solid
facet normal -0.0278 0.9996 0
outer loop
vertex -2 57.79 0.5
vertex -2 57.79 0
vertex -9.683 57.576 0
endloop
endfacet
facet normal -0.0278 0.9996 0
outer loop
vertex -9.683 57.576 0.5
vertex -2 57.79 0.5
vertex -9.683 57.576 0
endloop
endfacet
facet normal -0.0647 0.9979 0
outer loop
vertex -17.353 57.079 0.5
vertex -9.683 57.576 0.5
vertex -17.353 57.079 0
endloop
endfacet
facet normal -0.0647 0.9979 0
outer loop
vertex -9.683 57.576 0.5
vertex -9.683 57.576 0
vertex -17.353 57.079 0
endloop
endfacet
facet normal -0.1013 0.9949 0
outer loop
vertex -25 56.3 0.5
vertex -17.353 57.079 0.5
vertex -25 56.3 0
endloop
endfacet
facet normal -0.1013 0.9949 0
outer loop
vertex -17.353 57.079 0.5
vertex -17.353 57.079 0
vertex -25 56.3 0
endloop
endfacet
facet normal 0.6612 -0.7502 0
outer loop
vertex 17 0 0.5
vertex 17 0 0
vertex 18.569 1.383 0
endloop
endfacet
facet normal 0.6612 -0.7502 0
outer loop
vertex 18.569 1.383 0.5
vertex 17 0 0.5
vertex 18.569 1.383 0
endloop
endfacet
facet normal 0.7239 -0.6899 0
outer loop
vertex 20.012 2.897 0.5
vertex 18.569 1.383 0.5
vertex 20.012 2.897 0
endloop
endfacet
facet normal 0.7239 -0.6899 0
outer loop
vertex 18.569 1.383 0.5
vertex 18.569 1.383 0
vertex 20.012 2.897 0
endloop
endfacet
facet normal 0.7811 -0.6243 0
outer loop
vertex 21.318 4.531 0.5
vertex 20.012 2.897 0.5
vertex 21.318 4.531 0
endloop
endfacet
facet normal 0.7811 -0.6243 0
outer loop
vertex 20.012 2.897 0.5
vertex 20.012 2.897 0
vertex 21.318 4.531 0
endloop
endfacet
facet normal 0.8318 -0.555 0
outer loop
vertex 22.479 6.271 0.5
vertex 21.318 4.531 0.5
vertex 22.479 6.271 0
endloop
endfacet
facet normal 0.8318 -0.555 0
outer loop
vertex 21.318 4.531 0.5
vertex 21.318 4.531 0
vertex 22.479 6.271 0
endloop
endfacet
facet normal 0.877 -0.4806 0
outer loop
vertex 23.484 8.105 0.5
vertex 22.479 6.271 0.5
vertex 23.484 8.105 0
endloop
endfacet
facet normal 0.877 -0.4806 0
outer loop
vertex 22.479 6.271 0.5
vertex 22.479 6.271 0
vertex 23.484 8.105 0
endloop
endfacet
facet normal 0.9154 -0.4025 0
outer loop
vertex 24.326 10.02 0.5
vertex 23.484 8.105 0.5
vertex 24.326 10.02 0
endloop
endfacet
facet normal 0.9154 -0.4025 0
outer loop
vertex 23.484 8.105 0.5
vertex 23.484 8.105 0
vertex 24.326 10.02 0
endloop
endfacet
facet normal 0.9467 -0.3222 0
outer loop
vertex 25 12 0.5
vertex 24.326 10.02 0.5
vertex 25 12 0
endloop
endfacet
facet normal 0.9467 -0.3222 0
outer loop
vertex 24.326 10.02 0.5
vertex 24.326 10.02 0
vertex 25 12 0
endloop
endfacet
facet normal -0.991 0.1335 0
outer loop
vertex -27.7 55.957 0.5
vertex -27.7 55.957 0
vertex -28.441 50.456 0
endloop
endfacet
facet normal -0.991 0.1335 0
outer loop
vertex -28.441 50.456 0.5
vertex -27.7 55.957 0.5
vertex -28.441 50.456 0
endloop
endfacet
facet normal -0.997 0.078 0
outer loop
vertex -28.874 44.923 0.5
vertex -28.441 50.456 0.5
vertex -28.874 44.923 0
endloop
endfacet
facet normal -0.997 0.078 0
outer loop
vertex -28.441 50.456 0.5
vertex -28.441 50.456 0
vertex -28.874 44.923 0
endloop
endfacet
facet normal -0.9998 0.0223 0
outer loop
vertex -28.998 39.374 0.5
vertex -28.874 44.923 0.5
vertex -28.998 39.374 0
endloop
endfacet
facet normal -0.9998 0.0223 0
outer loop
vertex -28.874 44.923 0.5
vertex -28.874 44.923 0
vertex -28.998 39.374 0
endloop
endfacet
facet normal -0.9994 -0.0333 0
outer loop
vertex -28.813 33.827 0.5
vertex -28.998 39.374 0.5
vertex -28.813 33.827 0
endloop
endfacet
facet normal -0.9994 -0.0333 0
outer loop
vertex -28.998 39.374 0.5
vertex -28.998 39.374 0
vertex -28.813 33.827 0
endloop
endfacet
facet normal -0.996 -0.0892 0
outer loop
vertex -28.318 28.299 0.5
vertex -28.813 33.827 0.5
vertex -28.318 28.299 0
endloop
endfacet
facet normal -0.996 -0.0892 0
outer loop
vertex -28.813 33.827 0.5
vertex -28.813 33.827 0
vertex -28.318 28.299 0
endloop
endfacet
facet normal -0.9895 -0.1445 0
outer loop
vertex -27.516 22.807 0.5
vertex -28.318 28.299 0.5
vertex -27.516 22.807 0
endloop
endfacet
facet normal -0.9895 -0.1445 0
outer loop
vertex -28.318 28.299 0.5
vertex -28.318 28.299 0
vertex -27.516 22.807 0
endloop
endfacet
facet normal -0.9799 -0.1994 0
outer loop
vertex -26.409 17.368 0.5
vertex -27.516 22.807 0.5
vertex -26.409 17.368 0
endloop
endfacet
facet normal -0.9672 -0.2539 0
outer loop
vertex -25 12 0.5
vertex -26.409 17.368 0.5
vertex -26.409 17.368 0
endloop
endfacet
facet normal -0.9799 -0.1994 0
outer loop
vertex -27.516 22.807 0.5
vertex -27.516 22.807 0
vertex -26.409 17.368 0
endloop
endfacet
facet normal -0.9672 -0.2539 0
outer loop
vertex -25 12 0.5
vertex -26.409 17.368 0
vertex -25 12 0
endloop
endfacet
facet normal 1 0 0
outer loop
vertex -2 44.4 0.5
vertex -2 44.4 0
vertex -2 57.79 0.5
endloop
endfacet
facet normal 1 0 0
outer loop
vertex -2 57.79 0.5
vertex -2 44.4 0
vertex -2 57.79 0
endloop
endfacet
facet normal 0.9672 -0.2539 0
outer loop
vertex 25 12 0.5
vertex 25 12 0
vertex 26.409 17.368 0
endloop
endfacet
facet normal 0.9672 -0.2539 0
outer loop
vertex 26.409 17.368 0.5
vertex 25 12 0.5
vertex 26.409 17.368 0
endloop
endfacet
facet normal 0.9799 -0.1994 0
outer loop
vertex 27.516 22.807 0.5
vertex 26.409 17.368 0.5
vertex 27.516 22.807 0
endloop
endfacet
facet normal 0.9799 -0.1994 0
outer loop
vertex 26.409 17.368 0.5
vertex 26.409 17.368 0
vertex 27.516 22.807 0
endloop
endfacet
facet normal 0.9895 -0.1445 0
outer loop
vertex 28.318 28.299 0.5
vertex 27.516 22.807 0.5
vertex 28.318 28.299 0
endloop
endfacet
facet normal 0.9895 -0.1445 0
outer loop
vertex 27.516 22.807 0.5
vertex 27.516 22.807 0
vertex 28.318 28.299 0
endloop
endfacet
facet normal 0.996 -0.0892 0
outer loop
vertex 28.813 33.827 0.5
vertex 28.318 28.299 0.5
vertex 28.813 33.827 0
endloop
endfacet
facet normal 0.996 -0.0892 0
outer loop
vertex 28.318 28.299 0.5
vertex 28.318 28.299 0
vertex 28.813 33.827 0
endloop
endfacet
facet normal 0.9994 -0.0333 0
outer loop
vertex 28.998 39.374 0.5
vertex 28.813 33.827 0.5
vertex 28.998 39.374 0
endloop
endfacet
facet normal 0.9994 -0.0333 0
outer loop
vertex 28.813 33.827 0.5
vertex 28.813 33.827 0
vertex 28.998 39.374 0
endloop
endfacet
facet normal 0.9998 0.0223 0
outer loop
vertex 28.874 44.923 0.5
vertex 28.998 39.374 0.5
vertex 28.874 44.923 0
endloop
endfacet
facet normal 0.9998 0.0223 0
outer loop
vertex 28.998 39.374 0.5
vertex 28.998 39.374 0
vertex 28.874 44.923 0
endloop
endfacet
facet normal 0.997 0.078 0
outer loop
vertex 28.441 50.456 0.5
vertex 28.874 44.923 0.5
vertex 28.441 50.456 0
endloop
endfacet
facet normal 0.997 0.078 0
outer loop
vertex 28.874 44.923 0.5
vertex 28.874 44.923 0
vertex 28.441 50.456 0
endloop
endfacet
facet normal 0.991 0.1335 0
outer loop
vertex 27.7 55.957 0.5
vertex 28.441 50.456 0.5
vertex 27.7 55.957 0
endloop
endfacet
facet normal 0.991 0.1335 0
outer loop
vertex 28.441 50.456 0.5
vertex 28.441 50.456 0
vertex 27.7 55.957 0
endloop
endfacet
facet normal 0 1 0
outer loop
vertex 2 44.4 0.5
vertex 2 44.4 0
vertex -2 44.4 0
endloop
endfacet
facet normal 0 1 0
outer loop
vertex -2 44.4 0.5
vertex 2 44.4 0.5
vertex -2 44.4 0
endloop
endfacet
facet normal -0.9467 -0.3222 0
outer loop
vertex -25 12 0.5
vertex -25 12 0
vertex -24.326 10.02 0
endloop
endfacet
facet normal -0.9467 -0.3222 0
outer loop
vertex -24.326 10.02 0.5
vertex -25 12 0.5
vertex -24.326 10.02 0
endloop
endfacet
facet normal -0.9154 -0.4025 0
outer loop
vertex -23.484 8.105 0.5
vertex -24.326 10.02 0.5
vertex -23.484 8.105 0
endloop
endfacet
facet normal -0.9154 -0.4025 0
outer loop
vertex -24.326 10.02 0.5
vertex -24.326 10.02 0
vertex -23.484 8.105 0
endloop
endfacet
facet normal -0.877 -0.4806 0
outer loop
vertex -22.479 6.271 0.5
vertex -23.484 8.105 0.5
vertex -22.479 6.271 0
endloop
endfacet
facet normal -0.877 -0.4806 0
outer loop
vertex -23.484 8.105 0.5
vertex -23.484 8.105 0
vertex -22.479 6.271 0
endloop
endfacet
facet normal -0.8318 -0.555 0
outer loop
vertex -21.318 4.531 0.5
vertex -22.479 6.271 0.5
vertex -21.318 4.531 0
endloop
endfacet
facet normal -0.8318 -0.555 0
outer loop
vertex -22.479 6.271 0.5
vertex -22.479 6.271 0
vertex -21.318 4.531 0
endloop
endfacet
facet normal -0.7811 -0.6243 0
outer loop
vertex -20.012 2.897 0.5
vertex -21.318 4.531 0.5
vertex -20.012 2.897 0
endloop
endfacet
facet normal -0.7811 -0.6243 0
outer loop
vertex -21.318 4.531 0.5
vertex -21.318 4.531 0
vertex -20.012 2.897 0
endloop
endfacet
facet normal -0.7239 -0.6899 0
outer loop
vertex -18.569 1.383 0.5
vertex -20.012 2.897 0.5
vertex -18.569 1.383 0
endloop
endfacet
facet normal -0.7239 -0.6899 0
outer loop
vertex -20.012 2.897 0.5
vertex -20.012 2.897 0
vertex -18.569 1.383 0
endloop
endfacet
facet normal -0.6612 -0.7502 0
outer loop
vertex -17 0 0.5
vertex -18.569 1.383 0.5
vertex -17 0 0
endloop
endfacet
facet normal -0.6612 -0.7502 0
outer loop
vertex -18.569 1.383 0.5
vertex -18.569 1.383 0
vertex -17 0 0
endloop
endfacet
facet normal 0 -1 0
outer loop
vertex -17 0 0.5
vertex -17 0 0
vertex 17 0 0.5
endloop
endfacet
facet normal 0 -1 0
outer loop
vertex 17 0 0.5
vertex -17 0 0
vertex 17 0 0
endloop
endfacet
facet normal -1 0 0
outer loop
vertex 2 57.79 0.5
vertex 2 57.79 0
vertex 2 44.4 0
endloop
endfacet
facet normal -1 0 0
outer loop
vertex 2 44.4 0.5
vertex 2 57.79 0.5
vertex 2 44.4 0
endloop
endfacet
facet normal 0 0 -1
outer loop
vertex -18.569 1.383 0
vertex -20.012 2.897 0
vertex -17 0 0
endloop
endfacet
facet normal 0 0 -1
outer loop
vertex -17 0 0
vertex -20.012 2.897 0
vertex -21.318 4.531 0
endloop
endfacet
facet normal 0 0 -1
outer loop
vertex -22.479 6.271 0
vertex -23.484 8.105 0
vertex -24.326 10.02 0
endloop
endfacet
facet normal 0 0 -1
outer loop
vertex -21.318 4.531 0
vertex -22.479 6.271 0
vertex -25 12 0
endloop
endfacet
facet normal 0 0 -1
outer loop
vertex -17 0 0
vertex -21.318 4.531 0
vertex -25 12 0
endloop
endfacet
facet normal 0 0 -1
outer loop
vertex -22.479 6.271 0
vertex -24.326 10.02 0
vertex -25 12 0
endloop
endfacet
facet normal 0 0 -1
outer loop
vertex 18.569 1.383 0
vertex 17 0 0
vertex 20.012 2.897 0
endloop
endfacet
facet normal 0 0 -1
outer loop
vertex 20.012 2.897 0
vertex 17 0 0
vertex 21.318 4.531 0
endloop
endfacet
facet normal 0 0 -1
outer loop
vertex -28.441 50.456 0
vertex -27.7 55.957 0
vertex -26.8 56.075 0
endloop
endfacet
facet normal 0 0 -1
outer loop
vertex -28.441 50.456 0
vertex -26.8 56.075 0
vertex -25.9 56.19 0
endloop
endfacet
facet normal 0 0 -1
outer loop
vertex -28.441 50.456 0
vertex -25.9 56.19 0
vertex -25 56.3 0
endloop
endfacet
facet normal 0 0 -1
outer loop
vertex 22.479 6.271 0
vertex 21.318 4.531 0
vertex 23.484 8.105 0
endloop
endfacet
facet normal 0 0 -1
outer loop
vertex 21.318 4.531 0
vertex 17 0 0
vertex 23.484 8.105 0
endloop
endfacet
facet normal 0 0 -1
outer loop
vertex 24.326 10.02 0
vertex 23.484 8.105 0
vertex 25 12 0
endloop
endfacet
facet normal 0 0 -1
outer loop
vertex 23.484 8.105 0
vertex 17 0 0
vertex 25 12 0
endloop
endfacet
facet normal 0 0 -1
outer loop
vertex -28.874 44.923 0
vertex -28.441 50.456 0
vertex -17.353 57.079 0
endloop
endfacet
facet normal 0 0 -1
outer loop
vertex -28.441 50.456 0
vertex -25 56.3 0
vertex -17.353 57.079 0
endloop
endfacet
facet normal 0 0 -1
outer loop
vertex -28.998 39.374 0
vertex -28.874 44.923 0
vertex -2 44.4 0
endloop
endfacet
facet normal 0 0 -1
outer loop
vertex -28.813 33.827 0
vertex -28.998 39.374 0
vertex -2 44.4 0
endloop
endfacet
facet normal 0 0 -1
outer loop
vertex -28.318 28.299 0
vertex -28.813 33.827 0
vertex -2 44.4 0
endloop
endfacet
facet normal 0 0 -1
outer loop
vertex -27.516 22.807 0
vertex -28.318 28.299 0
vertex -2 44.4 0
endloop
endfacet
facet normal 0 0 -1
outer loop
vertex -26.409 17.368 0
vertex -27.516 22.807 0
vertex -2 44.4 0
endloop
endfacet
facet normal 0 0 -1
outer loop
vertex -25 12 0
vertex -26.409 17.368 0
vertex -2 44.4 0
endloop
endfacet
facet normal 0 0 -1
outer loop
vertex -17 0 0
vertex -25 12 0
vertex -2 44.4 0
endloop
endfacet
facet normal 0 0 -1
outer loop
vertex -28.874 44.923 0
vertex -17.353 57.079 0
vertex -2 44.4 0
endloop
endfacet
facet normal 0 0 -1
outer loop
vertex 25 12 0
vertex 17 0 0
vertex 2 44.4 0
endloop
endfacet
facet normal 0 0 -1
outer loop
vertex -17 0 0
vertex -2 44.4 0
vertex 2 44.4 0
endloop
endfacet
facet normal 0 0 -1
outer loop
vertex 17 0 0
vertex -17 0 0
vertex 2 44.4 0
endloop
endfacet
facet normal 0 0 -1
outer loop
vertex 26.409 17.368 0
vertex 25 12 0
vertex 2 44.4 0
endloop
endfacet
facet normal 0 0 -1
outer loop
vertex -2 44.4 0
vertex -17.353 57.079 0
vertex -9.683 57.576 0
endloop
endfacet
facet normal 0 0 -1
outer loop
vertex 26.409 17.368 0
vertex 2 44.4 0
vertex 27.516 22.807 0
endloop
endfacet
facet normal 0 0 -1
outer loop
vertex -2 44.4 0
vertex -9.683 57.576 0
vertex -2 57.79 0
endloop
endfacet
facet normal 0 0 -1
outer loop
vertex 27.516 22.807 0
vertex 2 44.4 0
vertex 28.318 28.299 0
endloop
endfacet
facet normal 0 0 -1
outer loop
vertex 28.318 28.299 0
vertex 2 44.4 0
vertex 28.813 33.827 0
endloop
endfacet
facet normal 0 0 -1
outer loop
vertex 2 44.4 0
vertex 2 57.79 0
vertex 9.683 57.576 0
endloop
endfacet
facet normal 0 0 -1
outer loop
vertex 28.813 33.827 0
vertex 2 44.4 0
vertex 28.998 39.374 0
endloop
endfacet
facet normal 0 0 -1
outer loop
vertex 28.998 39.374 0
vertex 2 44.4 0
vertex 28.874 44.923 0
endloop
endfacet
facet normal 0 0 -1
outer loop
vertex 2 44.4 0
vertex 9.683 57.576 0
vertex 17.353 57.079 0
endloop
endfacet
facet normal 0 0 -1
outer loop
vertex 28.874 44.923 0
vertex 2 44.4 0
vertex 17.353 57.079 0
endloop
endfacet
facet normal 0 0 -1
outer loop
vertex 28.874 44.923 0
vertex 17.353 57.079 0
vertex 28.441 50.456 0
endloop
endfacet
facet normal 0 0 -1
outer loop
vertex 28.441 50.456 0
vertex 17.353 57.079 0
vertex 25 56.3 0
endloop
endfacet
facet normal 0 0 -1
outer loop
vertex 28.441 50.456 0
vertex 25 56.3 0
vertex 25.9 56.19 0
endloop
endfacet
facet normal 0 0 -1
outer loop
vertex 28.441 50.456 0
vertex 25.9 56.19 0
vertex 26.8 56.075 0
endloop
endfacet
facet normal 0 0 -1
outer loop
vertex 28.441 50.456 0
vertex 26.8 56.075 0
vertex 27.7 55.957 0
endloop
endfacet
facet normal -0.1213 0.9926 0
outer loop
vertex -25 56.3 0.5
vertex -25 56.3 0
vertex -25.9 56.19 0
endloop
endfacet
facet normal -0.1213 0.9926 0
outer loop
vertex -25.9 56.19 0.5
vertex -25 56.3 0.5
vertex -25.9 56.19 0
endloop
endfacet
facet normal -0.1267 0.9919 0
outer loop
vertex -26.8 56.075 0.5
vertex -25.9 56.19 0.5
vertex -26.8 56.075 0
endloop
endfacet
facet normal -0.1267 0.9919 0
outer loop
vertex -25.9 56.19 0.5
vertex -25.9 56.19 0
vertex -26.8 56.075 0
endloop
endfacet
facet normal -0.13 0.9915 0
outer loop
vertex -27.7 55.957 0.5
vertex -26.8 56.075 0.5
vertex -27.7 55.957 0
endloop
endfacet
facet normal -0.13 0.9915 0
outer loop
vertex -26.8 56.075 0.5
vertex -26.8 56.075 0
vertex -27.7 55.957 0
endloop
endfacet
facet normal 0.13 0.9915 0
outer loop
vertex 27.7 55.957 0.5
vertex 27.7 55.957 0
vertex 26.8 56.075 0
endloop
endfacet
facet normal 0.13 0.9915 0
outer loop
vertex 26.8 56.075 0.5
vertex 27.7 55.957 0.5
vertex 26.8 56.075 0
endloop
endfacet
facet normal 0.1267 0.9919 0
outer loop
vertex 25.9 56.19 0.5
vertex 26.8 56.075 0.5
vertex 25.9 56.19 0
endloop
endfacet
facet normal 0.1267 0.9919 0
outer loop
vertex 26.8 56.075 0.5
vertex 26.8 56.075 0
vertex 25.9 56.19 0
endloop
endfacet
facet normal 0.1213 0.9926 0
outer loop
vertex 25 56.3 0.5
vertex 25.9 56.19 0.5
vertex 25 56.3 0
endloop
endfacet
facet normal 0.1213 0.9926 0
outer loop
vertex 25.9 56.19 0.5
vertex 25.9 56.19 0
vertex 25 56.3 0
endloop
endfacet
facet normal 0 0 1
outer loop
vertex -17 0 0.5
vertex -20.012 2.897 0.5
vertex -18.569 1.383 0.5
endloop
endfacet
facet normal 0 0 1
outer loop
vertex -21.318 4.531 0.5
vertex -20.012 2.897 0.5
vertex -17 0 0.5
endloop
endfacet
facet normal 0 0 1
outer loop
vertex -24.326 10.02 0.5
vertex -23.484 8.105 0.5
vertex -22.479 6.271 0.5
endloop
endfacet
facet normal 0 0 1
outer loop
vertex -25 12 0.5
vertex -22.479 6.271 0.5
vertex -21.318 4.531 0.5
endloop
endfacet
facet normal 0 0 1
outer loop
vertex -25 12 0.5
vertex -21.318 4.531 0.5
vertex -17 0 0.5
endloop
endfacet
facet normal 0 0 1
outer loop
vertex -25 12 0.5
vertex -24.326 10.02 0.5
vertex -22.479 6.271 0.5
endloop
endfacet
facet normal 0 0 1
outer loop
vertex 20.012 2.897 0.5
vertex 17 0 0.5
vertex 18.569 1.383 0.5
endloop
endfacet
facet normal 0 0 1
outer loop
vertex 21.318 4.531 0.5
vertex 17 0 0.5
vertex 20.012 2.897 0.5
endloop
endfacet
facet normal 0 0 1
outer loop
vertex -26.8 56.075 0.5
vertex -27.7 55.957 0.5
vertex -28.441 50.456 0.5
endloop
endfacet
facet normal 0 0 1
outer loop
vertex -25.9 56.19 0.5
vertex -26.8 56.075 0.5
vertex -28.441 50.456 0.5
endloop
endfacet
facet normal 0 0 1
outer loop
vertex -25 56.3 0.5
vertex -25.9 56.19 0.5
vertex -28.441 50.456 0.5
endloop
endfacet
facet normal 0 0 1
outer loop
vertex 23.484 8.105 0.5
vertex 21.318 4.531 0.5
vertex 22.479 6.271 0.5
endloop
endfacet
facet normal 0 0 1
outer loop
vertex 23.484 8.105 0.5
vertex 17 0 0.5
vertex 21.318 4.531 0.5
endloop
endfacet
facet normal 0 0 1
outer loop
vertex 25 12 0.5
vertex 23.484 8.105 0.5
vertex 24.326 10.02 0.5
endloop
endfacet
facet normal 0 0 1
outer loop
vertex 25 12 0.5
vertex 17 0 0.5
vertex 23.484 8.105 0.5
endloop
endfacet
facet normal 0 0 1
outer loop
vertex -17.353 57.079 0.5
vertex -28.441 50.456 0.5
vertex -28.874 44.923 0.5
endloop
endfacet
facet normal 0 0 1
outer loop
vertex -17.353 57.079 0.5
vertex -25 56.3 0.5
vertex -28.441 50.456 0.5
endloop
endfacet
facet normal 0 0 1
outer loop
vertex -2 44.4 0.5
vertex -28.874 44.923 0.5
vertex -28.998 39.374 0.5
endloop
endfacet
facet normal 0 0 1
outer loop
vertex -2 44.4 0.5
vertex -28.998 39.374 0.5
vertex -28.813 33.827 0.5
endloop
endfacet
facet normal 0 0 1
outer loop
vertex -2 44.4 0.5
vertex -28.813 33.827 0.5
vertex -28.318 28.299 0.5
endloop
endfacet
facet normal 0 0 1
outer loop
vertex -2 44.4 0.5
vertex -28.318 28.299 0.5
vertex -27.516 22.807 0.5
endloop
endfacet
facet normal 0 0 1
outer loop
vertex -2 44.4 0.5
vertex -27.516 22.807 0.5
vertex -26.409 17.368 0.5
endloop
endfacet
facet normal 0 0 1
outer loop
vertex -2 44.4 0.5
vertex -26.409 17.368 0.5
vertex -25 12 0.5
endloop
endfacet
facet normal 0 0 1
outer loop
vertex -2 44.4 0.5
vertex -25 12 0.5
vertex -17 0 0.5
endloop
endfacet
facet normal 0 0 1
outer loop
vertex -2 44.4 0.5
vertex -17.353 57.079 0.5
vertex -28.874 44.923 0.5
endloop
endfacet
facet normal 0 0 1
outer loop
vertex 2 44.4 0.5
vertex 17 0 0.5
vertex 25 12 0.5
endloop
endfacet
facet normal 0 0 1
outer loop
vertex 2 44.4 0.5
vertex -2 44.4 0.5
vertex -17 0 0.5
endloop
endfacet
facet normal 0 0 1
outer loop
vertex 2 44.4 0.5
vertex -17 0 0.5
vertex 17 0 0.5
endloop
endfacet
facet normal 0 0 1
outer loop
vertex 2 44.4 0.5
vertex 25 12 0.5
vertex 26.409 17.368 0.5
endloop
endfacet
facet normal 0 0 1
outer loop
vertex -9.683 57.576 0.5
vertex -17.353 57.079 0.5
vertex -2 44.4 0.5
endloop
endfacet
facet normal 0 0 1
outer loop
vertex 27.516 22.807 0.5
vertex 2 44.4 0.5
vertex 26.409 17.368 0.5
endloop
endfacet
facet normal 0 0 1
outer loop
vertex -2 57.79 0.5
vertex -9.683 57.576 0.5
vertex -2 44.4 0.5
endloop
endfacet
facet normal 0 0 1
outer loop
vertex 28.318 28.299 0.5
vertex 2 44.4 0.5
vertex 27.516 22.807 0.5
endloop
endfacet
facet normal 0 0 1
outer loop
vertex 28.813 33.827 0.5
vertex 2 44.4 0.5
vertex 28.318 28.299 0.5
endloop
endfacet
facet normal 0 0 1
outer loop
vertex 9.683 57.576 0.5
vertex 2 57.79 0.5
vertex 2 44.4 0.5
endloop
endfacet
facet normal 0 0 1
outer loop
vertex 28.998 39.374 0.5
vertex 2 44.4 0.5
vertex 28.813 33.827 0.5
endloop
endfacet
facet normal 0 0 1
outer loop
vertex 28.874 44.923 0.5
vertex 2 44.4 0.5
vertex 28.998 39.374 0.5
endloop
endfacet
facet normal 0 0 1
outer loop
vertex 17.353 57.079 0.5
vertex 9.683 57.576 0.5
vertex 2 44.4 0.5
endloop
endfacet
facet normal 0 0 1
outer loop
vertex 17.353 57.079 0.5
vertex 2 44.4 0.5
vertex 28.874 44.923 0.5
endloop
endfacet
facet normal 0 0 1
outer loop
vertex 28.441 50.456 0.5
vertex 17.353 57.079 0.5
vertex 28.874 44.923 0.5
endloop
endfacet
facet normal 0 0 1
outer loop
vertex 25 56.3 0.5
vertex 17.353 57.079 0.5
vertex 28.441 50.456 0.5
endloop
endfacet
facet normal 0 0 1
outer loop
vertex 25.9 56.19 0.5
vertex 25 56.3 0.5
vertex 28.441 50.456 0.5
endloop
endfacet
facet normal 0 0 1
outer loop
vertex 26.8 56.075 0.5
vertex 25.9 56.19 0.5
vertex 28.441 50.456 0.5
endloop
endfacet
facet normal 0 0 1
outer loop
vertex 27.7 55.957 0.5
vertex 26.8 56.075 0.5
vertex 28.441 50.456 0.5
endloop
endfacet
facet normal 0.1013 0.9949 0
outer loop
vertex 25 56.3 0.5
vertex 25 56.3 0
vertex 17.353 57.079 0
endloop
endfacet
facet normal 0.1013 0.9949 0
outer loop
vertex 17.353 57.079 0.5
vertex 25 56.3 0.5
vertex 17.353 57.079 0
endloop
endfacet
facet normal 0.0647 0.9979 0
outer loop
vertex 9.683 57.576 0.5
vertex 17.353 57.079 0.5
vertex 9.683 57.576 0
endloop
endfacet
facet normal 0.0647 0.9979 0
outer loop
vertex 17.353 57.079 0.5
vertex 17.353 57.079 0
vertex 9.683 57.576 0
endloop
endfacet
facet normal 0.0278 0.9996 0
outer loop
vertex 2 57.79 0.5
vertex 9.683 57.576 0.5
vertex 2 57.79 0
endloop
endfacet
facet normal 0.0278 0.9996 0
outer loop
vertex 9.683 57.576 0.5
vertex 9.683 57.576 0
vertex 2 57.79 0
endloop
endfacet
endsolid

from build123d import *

# Parameters (mm, degrees)
F1_DEPTH = 0.5


with BuildPart() as f1:
    # F0 (on Top) → F1 (new body)
    with BuildSketch(Plane.XY):
        with BuildLine():
            ThreePointArc((-2, 57.790434), (-13.520553, 57.362383), (-25, 56.3))
            ThreePointArc((-25, 56.3), (-26.350558, 56.132887), (-27.7, 55.956987))
            ThreePointArc((-27.7, 55.956987), (-28.812855, 33.827216), (-25, 12))
            ThreePointArc((-25, 12), (-21.917468, 5.388354), (-17, 0))
            Line((-17, 0), (17, 0))
            ThreePointArc((17, 0), (21.917468, 5.388354), (25, 12))
            ThreePointArc((25, 12), (28.812855, 33.827216), (27.7, 55.956987))
            ThreePointArc((27.7, 55.956987), (26.350558, 56.132887), (25, 56.3))
            ThreePointArc((25, 56.3), (13.520553, 57.362383), (2, 57.790434))
            Line((2, 57.790434), (2, 44.4))
            Line((2, 44.4), (-2, 44.4))
            Line((-2, 44.4), (-2, 57.790434))
        make_face()
    extrude(amount=F1_DEPTH)


solid = f1.part
